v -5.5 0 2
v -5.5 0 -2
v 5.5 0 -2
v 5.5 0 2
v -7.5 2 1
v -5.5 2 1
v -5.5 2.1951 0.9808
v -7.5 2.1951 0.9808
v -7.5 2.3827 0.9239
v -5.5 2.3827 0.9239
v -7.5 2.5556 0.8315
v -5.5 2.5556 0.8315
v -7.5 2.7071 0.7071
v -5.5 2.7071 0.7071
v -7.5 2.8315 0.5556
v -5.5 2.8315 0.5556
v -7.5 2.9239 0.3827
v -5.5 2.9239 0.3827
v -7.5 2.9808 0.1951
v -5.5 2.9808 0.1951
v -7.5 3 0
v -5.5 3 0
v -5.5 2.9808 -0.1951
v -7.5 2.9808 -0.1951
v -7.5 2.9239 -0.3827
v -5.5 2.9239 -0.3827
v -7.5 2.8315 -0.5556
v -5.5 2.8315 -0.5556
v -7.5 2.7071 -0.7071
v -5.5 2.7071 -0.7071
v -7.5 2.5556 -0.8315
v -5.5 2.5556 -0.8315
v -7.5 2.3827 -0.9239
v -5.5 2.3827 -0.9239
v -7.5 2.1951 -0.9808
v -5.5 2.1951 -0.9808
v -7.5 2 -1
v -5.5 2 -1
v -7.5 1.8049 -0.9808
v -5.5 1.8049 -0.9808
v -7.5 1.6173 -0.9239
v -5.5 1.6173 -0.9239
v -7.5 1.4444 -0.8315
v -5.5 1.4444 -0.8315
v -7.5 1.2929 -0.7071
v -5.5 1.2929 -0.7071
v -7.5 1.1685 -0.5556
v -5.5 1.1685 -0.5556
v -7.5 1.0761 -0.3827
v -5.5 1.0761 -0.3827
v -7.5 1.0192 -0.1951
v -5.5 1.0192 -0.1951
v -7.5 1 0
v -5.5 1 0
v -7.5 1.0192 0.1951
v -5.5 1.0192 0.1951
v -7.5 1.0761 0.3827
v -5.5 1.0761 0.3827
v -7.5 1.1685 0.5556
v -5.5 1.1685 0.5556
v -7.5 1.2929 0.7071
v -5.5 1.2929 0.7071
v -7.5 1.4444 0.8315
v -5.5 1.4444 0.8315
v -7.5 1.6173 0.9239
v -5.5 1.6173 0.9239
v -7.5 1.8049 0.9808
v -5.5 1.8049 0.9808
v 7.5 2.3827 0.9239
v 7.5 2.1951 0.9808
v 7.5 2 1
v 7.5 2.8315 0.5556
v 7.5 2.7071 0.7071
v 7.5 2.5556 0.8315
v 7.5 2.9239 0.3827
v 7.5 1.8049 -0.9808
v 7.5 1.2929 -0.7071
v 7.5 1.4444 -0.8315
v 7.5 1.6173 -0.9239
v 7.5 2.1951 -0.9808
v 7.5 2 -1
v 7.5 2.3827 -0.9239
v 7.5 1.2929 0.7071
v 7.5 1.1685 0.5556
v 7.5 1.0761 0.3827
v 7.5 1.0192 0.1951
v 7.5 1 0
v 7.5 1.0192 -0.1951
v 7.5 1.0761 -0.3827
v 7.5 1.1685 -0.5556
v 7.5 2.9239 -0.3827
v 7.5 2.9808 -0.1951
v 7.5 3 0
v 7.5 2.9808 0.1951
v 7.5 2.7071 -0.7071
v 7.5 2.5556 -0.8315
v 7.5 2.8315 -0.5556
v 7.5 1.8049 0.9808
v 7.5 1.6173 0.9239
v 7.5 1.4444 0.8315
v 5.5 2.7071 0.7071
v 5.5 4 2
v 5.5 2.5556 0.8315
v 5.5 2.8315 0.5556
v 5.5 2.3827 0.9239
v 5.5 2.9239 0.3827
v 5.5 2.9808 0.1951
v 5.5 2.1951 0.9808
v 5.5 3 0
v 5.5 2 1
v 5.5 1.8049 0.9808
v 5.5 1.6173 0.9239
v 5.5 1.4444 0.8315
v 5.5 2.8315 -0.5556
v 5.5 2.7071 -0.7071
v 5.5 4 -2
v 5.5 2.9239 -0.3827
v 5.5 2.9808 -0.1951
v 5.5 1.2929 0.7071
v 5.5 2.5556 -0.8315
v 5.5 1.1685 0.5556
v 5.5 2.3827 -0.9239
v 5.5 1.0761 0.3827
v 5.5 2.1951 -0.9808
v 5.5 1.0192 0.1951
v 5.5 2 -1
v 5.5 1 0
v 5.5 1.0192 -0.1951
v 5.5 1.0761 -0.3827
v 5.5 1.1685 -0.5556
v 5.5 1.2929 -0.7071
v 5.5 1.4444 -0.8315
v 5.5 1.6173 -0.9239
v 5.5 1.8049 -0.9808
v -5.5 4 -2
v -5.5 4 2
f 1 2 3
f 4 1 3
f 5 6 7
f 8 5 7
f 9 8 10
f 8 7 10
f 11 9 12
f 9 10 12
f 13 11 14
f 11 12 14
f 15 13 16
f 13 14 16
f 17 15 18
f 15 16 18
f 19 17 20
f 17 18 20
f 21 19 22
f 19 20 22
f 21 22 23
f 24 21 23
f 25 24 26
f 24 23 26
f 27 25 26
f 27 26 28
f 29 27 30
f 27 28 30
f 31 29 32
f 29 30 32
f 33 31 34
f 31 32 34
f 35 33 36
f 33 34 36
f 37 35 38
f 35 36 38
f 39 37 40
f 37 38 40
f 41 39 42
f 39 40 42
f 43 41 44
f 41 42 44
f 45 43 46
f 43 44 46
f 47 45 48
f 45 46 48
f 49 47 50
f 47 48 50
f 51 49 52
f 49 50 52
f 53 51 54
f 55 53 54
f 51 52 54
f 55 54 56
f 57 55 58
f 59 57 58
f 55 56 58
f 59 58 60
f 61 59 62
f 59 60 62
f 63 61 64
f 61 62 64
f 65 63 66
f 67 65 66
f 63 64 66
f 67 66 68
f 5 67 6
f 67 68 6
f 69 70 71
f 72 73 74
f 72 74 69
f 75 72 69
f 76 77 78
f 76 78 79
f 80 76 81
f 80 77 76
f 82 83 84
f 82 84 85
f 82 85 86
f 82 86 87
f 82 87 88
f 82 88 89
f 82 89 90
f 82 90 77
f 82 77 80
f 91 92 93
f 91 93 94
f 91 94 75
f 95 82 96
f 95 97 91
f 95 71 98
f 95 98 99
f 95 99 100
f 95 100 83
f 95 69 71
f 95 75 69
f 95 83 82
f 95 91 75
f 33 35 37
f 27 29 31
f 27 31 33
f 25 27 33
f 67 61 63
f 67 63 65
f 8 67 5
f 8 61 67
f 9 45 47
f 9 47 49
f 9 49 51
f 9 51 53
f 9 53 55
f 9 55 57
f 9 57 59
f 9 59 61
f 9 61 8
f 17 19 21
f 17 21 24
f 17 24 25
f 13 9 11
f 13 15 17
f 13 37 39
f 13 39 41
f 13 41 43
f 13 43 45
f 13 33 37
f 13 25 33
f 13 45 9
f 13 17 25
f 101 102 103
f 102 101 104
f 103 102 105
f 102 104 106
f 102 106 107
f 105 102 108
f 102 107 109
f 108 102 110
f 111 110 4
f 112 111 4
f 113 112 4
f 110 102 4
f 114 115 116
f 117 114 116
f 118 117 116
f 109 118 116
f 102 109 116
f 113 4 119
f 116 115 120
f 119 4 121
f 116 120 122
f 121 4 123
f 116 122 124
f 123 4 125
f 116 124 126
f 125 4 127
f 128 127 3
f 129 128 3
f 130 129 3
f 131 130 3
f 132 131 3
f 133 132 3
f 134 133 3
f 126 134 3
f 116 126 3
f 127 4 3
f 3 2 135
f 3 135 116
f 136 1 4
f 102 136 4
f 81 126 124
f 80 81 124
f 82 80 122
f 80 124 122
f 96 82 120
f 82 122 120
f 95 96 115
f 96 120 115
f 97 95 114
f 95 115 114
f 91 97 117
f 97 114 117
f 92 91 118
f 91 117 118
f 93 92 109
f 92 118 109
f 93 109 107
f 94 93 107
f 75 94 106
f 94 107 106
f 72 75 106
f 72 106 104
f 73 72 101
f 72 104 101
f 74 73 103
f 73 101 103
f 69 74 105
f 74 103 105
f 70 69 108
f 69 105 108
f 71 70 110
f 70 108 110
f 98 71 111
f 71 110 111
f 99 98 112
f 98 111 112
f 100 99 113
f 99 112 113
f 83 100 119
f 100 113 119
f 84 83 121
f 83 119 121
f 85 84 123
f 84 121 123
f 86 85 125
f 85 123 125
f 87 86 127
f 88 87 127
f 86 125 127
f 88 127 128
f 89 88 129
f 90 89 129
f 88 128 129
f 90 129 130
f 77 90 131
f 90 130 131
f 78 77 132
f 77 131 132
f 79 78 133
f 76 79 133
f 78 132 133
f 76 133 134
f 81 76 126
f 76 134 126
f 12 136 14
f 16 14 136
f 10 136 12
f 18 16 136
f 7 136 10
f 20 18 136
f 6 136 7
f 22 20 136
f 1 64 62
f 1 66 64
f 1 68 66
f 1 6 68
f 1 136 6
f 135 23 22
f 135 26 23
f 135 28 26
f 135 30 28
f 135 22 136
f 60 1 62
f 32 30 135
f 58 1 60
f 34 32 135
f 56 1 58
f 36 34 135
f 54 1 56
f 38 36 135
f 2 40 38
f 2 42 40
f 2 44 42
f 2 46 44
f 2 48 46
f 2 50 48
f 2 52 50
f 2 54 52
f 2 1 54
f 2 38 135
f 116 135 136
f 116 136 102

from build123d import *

# Parameters (mm, degrees)
SKETCH1_W           = 11
SKETCH1_H           = 4
BOSS_EXTRUDE1_DEPTH = 4
SKETCH2_R           = 1
BOSS_EXTRUDE2_DEPTH = 2
SKETCH3_R           = 1
BOSS_EXTRUDE3_DEPTH = 2


with BuildPart() as part:
    # Sketch1 → Boss-Extrude1 (new body)
    with BuildSketch(Plane(origin=(0, 0, 0), x_dir=(1, 0, 0), z_dir=(0, 1, 0))):
        Rectangle(SKETCH1_W, SKETCH1_H)
    extrude(amount=BOSS_EXTRUDE1_DEPTH)

    # Sketch2 → Boss-Extrude2 (add)
    with BuildSketch(Plane(origin=(5.5, 0, 0), x_dir=(0, 0, -1), z_dir=(1, 0, 0))):
        with Locations((0, 2)):
            Circle(SKETCH2_R)
    extrude(amount=BOSS_EXTRUDE2_DEPTH)

    # Sketch3 → Boss-Extrude3 (add)
    with BuildSketch(Plane.ZY.offset(5.5)):
        with Locations((0, 2)):
            Circle(SKETCH3_R)
    extrude(amount=BOSS_EXTRUDE3_DEPTH)


solid = part.part
